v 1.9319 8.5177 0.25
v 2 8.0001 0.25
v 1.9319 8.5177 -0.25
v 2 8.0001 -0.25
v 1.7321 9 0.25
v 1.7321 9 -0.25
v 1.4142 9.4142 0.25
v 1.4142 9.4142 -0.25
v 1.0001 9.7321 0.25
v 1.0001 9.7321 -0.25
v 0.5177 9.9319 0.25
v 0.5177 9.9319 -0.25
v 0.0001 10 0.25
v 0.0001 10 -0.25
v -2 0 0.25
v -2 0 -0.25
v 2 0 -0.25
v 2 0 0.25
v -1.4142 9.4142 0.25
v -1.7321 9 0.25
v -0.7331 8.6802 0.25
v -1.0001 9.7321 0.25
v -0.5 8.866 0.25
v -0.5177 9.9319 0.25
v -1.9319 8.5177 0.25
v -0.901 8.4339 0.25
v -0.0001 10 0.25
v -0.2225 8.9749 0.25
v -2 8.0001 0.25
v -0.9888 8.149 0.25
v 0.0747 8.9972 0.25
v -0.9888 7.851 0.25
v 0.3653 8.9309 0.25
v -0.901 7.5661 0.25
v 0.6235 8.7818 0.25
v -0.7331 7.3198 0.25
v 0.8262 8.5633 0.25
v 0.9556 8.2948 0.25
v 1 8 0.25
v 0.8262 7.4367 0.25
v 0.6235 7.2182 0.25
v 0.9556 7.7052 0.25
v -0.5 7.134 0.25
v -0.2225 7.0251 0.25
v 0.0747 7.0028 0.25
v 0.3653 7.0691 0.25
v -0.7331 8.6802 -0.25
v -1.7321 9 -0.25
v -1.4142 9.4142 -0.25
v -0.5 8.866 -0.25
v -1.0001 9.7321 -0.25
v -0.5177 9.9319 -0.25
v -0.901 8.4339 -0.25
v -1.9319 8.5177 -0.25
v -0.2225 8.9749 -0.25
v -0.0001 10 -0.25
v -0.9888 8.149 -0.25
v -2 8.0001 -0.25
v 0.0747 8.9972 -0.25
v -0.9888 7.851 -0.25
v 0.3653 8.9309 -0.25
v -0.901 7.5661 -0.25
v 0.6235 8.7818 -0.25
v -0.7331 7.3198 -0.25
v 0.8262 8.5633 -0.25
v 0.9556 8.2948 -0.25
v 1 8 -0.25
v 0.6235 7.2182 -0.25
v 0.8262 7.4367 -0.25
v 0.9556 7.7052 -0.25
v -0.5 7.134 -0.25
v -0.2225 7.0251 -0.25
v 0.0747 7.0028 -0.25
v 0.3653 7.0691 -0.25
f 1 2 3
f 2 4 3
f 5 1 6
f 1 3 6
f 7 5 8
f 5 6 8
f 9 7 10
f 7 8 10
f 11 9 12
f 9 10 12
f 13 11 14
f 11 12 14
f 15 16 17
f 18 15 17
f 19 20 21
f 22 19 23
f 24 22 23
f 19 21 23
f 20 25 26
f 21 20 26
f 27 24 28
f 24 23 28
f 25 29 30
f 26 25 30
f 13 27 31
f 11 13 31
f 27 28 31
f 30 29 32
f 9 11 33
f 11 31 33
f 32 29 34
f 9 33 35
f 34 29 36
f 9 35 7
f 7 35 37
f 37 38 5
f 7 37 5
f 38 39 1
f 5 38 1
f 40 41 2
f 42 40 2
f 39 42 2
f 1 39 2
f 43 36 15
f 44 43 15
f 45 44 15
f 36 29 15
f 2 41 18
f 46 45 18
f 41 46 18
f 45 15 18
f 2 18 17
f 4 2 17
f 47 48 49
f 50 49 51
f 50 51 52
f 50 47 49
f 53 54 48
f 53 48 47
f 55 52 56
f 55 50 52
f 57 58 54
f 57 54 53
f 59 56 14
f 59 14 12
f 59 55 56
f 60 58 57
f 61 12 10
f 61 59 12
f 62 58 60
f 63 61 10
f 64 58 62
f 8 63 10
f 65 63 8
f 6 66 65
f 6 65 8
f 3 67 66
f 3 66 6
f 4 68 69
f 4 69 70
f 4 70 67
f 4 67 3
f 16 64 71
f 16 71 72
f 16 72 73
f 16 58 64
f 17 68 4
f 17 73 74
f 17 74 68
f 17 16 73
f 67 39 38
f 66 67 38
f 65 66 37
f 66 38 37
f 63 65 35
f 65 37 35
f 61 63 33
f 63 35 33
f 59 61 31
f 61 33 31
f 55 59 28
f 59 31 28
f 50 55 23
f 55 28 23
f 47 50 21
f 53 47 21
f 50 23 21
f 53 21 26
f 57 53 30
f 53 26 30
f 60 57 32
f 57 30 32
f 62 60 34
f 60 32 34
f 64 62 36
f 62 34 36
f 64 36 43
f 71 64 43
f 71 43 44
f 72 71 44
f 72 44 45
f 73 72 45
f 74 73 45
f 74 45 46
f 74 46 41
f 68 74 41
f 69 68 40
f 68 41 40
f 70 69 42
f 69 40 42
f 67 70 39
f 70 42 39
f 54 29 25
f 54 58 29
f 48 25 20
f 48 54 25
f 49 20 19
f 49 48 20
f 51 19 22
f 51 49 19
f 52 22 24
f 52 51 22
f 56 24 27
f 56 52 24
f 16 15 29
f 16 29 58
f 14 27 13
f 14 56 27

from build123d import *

# Parameters (mm, degrees)
SKETCH1_W           = 4
SKETCH1_H           = 0.5
BOSS_EXTRUDE1_DEPTH = 10
FILLET1_R           = 2
SKETCH2_R           = 1
CUT_EXTRUDE1_DEPTH  = 0.5


with BuildPart() as part:
    # Sketch1 → Boss-Extrude1 (new body)
    with BuildSketch(Plane(origin=(0, 0, 0), x_dir=(1, 0, 0), z_dir=(0, 1, 0))):
        Rectangle(SKETCH1_W, SKETCH1_H)
    extrude(amount=BOSS_EXTRUDE1_DEPTH)

    # Fillet1
    fillet1_edges = [part.edges().sort_by_distance(p)[0] for p in [
        (-2, 10, 0),
        (2, 10, 0),
    ]]
    fillet(fillet1_edges, radius=FILLET1_R - 0.0001)  # a hair under: the kernel refuses the full size

    # Sketch2 → Cut-Extrude1 (cut)
    with BuildSketch(Plane.XY.offset(0.25)):
        with Locations((0, 8)):
            Circle(SKETCH2_R)
    extrude(amount=-CUT_EXTRUDE1_DEPTH, mode=Mode.SUBTRACT)


solid = part.part
